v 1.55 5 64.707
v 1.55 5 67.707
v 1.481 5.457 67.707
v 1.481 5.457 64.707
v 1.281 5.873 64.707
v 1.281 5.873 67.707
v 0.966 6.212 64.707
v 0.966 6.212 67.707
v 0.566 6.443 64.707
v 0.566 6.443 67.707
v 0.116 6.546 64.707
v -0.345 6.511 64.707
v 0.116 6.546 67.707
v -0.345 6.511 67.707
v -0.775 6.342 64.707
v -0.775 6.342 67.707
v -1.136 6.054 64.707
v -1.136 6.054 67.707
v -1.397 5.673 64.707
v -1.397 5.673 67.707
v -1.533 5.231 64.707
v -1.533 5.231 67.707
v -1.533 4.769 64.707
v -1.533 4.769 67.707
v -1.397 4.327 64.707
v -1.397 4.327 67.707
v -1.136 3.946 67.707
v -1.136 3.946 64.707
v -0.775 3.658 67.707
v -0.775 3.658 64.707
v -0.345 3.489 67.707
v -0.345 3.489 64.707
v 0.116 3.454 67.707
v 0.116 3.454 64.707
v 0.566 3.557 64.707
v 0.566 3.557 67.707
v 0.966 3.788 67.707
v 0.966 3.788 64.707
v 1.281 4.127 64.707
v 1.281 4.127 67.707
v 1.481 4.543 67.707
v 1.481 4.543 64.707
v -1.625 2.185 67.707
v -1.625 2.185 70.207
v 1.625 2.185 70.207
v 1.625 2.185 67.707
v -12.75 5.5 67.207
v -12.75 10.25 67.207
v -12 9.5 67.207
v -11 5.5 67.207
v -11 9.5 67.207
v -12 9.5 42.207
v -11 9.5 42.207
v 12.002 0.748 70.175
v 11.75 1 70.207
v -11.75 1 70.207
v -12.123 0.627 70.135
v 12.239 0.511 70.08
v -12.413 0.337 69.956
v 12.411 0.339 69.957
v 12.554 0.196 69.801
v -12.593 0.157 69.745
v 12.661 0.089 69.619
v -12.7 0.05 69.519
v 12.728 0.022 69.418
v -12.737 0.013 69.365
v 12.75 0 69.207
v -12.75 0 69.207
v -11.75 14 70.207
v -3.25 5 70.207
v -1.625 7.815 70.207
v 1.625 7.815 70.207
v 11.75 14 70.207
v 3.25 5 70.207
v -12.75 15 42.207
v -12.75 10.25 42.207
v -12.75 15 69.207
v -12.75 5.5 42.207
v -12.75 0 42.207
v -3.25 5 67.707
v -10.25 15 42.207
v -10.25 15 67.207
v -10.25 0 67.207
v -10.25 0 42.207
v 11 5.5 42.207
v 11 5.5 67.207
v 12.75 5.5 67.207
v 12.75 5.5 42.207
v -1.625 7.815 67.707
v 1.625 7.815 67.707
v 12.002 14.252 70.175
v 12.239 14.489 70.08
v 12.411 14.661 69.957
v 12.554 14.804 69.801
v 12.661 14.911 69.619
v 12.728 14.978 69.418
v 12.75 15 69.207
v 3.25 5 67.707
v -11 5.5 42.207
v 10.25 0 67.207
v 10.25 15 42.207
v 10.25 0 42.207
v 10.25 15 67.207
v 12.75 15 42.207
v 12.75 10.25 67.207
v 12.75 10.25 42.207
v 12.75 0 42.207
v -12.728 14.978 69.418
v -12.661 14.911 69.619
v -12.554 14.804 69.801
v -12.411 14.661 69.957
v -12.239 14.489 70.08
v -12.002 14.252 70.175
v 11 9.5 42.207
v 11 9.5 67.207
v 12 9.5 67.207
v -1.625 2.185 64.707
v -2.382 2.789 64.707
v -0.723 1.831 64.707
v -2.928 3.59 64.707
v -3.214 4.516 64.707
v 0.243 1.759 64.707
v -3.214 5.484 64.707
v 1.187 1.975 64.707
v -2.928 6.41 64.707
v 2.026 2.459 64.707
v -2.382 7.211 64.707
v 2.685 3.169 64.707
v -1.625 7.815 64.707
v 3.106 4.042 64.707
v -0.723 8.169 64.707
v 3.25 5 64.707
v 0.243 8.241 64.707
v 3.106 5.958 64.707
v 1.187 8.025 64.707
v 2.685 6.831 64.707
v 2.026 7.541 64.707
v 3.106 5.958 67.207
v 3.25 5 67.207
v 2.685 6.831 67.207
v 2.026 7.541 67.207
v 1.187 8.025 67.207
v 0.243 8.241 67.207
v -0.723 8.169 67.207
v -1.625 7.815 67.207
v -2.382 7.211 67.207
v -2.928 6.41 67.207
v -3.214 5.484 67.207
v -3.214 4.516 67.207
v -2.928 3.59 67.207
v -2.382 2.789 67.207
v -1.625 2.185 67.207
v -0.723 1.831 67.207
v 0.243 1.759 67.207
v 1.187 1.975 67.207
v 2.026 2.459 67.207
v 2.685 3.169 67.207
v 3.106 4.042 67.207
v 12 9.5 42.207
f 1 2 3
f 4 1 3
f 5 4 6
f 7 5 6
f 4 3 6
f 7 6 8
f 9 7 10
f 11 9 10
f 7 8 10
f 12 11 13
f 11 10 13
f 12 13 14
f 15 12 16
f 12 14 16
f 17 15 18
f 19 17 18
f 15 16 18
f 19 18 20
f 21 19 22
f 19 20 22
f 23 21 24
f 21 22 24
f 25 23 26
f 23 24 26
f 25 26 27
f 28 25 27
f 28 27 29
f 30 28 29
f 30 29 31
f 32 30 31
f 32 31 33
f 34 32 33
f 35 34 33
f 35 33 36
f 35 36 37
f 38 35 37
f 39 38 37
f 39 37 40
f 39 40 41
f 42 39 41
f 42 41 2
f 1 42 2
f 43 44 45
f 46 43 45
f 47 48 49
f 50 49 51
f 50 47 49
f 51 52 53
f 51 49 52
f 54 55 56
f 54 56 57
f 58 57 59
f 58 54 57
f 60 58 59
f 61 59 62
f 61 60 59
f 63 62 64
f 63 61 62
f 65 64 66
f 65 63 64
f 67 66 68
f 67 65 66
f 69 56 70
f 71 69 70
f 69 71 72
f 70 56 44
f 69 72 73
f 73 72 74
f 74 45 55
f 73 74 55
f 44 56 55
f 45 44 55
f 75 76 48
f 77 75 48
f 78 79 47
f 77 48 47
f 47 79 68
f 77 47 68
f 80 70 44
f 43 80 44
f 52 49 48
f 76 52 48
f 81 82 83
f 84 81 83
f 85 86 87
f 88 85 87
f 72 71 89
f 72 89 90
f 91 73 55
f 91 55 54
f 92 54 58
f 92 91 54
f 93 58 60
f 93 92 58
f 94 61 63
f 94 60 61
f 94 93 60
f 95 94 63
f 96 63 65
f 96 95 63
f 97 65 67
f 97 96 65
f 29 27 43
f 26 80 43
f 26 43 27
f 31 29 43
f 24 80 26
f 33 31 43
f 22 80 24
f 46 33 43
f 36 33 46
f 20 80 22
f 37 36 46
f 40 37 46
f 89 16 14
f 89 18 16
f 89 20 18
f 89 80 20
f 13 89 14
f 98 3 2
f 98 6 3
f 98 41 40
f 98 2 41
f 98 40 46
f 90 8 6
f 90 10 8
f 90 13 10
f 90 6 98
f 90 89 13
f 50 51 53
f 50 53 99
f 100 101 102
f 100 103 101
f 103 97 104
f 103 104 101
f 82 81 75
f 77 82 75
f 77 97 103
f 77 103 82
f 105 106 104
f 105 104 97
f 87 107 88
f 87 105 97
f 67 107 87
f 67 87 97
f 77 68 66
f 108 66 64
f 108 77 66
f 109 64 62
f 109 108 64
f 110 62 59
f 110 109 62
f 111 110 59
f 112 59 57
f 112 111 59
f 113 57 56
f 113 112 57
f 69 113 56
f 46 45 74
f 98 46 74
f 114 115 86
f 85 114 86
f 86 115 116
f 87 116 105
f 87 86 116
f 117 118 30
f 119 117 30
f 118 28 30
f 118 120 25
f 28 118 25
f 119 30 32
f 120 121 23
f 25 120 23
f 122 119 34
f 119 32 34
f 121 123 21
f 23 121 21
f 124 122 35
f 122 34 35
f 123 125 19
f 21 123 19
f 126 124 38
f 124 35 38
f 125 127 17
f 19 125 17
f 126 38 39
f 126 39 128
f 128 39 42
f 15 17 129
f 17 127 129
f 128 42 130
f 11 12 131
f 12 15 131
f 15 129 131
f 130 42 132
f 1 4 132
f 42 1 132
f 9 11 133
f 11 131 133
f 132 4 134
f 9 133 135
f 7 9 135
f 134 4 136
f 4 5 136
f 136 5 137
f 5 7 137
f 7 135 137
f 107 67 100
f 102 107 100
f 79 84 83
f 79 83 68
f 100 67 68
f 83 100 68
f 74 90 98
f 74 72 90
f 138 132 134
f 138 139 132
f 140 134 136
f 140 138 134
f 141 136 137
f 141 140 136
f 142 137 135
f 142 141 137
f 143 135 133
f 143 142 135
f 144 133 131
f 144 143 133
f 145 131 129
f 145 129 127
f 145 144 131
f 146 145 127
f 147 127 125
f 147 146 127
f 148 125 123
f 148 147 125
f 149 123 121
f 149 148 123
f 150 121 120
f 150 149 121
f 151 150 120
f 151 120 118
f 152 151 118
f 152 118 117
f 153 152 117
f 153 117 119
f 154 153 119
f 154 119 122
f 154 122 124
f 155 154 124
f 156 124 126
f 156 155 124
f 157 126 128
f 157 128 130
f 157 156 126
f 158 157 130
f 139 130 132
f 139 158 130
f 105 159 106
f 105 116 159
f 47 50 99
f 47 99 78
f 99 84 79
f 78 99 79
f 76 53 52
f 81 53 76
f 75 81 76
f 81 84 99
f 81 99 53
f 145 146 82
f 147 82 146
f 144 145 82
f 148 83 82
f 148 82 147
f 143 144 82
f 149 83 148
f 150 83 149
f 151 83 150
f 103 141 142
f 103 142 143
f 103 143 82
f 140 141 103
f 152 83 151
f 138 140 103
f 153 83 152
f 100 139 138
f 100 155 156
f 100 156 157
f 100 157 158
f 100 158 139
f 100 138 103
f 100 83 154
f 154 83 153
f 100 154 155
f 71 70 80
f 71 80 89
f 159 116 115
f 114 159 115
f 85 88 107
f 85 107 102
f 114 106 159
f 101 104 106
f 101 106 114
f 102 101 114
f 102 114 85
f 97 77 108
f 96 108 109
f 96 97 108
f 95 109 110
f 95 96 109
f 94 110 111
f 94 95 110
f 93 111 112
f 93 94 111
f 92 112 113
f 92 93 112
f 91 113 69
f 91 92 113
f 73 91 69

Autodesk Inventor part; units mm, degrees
ref_plane "YZ Plane" through (0, 0, 0) normal (1, 0, 0) x (0, 1, 0)
ref_plane "XZ Plane" through (0, 0, 0) normal (0, 1, 0) x (-1, 0, 0)
ref_plane "XY Plane" through (0, 0, 0) normal (0, 0, 1) x (1, 0, 0)
sketch "Эскиз1" plane through (0, 0, 0) normal (0, 1, 0) x (-1, 0, 0)
  line L0 (0, 56.6418) -> (23.7825, 76.5969) construction
  line L1 (44.1942, 76.014) -> (76.014, 44.1942) construction
  line L2 (91.1, 52.2091) -> (52.2091, 91.1) construction
  line L3 (0, 0) -> (74.2462, 74.2462) construction
  arc A0 (92.5543, 49.5852) -> (48.7014, 93.0224) centre (0, 0) ccw construction
  line L4 (52.2091, 91.1) -> (48.6736, 87.5645) construction
  arc A1 (44.1942, 83.085) -> (44.1942, 76.014) centre (47.7297, 79.5495) ccw construction
  line L5 (52.2091, 91.1) -> (48.6736, 87.5645) construction
  line L6 (48.6736, 87.5645) -> (52.2091, 91.1) construction
  spline S0 degree 2 poles (48.6736, 87.5645) (52.2091, 91.1) (48.7014, 93.0224) knots 1 1 1 2 2 2 construction
  line L7 (52.2091, 91.1) -> (48.7014, 93.0224) construction
  line L8 (52.2091, 91.1) -> (48.7014, 93.0224) construction
  arc A2 (48.7014, 93.0224) -> (44.0271, 95.3237) centre (0, 0) ccw construction
  arc A3 (44.0271, 95.3237) -> (43.577, 95.5303) centre (0, 0) ccw construction
  line L9 (42.6652, 95.941) -> (43.577, 95.5303) construction
  line L10 (42.6652, 95.941) -> (43.577, 95.5303) construction
  spline S1 degree 2 poles (42.0492, 94.5734) (42.6652, 95.941) (43.577, 95.5303) knots 1 1 1 2 2 2 construction
  line L11 (42.0492, 94.5734) -> (42.6652, 95.941) construction
  line L12 (42.6652, 95.941) -> (42.0492, 94.5734) construction
  line L13 (0, 0) -> (0, 209.8821) construction
  spline S2 degree 2 poles (-48.6736, 87.5645) (-52.2091, 91.1) (-48.7014, 93.0224) knots 1 1 1 2 2 2 construction
  line L14 (-48.6736, 87.5645) -> (-52.2091, 91.1) construction
  line L15 (-52.2091, 91.1) -> (-48.7014, 93.0224) construction
  arc A4 (-44.1942, 76.014) -> (-44.1942, 83.085) centre (-47.7297, 79.5495) ccw construction
  line L16 (-44.1942, 76.014) -> (-76.014, 44.1942) construction
  arc A5 (-48.7014, 93.0224) -> (-92.5543, 49.5852) centre (0, 0) ccw construction
  arc A6 (-83.085, 44.1942) -> (-76.014, 44.1942) centre (-79.5495, 47.7297) ccw construction
  line L17 (-83.085, 44.1942) -> (-87.3563, 48.4654) construction
  spline S3 degree 2 poles (-48.6736, -87.5645) (-52.2091, -91.1) (-48.7014, -93.0224) knots 1 1 1 2 2 2 construction
  line L18 (-48.6736, -87.5645) -> (-52.2091, -91.1) construction
  line L19 (-52.2091, -91.1) -> (-48.7014, -93.0224) construction
  circle A7 centre (0, 0) radius 35 construction
  line L20 (-46.3155, -73.8927) -> (-73.8927, -46.3155) construction
  arc A8 (-73.8927, -46.3155) -> (-85.2064, -46.3155) centre (-79.5495, -51.9723) ccw construction
  line L21 (-85.2064, -46.3155) -> (-87.5645, -48.6736) construction
  line L22 (-87.5645, -48.6736) -> (-91.1, -52.2091) construction
  spline S4 degree 2 poles (-87.5645, -48.6736) (-91.1, -52.2091) (-92.5543, -49.5852) knots 1 1 1 2 2 2 construction
  line L23 (-91.1, -52.2091) -> (-92.5543, -49.5852) construction
  arc A9 (-92.5543, -49.5852) -> (-48.7014, -93.0224) centre (0, 0) ccw construction
  arc A10 (-92.5543, 49.5852) -> (-92.5543, -49.5852) centre (0, 0) ccw construction
  line L24 (48.6736, -87.5645) -> (46.3155, -85.2064) construction
  arc A11 (-46.3155, -85.2064) -> (-46.3155, -73.8927) centre (-51.9723, -79.5495) ccw construction
  line L25 (-48.6736, -87.5645) -> (-46.3155, -85.2064) construction
  arc A12 (-48.7014, -93.0224) -> (48.7014, -93.0224) centre (0, 0) ccw construction
  arc A13 (46.3155, -73.8927) -> (46.3155, -85.2064) centre (51.9723, -79.5495) ccw construction
  arc A14 (43.577, 95.5303) -> (-43.577, 95.5303) centre (0, 0) ccw construction
  arc A15 (23.7825, 76.5969) -> (0, 67.941) centre (0, 104.941) ccw construction
  line L26 (0, 56.6418) -> (-35.5516, 86.4744) construction
  line L27 (44.0271, 95.3237) -> (44.0271, 127.8162) construction
  ellipse E0 centre (0, 102.7511) end of major axis (44.0271, 102.7511) minor radius 27.5932 (42.0492, 94.5734) -> (35.2734, 86.2384) ccw construction
  line L28 (42.6652, 95.941) -> (-42.6652, 95.941) construction
  ellipse E1 centre (0, 102.7511) end of major axis (44.5159, 105.2445) minor radius 28.887 (35.2734, 86.2384) -> (42.0492, 94.5734) ccw construction
  line L29 (23.7825, 76.5969) -> (35.2734, 86.2384) construction
  arc A16 (0, 67.941) -> (23.7825, 76.5969) centre (0, 104.941) ccw construction
  arc A17 (-23.7825, 76.5969) -> (0, 67.941) centre (0, 104.941) ccw construction
  line L30 (-23.7825, 76.5969) -> (-35.2734, 86.2384) construction
  line L31 (-42.6652, 95.941) -> (-42.0492, 94.5734) construction
  arc A18 (-43.577, 95.5303) -> (-48.7014, 93.0224) centre (0, 0) ccw construction
  line L32 (-42.6652, 95.941) -> (-43.577, 95.5303) construction
  spline S5 degree 2 poles (-42.0492, 94.5734) (-42.6652, 95.941) (-43.577, 95.5303) knots 1 1 1 2 2 2 construction
  line L33 (-42.0492, 94.5734) -> (-42.6652, 95.941) construction
  line L34 (-42.6652, 95.941) -> (-43.577, 95.5303) construction
  line L35 (-42.6652, 95.941) -> (-43.577, 95.5303) construction
  spline S6 degree 2 poles (-42.0492, 94.5734) (-42.6652, 95.941) (-43.577, 95.5303) knots 1 1 1 2 2 2 construction
  line L36 (-42.0492, 94.5734) -> (-42.6652, 95.941) construction
  ellipse E2 centre (0, 102.7511) end of major axis (-44.5159, 105.2445) minor radius 28.887 (-42.0492, 94.5734) -> (-35.2734, 86.2384) ccw construction
  line L37 (83.085, 44.1942) -> (87.5645, 48.6736) construction
  arc A19 (76.014, 44.1942) -> (83.085, 44.1942) centre (79.5495, 47.7297) ccw construction
  spline S7 degree 2 poles (48.6736, -87.5645) (52.2091, -91.1) (48.7014, -93.0224) knots 1 1 1 2 2 2 construction
  line L38 (48.6736, -87.5645) -> (52.2091, -91.1) construction
  line L39 (52.2091, -91.1) -> (48.7014, -93.0224) construction
  line L40 (46.3155, -73.8927) -> (73.8927, -46.3155) construction
  arc A20 (85.2064, -46.3155) -> (73.8927, -46.3155) centre (79.5495, -51.9723) ccw construction
  line L41 (85.2064, -46.3155) -> (87.5645, -48.6736) construction
  spline S8 degree 2 poles (87.5645, -48.6736) (91.1, -52.2091) (92.5543, -49.5852) knots 1 1 1 2 2 2 construction
  line L42 (87.5645, -48.6736) -> (91.1, -52.2091) construction
  line L43 (91.1, -52.2091) -> (92.5543, -49.5852) construction
  arc A21 (92.5543, -49.5852) -> (92.5543, 49.5852) centre (0, 0) ccw construction
  arc A22 (48.7014, -93.0224) -> (92.5543, -49.5852) centre (0, 0) ccw construction
  arc A23 (28.5452, 71.4571) -> (-28.5452, 71.4571) centre (0, 104.941) ccw construction
  line L44 (-83.085, 34.2947) -> (-90.6891, 41.8987) construction
  line L45 (-93.5297, 47.6709) -> (-92.5543, 49.5852) construction
  line L46 (-29.1816, 81.127) -> (-76.014, 34.2947) construction
  arc A24 (-83.085, 34.2947) -> (-76.014, 34.2947) centre (-79.5495, 37.8302) ccw construction
  line L47 (-34.1491, 76.1596) -> (-28.5452, 71.4571) construction
  arc A25 (-30.6393, 73.2144) -> (-37.3889, 72.9198) centre (-33.8534, 69.3842) ccw construction
  arc A26 (-90.6891, 41.8987) -> (-87.3563, 48.4654) centre (0, 0) ccw construction
  arc A27 (37.3889, 72.9198) -> (30.6393, 73.2144) centre (33.8534, 69.3842) ccw construction
  line L48 (29.1816, 81.127) -> (76.014, 34.2947) construction
  arc A28 (76.014, 34.2947) -> (83.085, 34.2947) centre (79.5495, 37.8302) ccw construction
  line L49 (83.085, 34.2947) -> (90.6891, 41.8987) construction
  arc A29 (76.014, 44.1942) -> (83.085, 44.1942) centre (79.5495, 47.7297) ccw construction
  line L50 (44.1942, 76.014) -> (76.014, 44.1942) construction
  arc A30 (44.1942, 83.085) -> (44.1942, 76.014) centre (47.7297, 79.5495) ccw construction
  arc A31 (5.5413, 61.2914) -> (28.5452, 71.4571) centre (0, 104.941) ccw
  arc A32 (-28.5452, 71.4571) -> (5.5413, 61.2914) centre (0, 104.941) ccw
  line L51 (34.1491, 76.1596) -> (28.5452, 71.4571) construction
  arc A33 (-87.3563, 48.4654) -> (-90.6891, 41.8987) centre (0, 0) ccw construction
  line L52 (83.085, 44.1942) -> (87.3563, 48.4654) construction
  arc A34 (90.6891, 41.8987) -> (87.3563, 48.4654) centre (0, 0) ccw construction
  line L53 (-44.1942, 83.085) -> (-48.6736, 87.5645) construction
  line L54 (44.0271, 95.3237) -> (43.577, 95.5303) construction
  line L55 (48.6736, 87.5645) -> (44.1942, 83.085) construction
  line L56 (0, 104.941) -> (-23.6028, 54.3247) construction
  circle A35 centre (31.1916, 76.2887) radius 2 construction
  line L57 (29.1816, 81.127) -> (23.7825, 76.5969)
  line L58 (29.1816, 81.127) -> (34.1491, 76.1596)
  line L59 (34.1491, 76.1596) -> (28.5452, 71.4571)
  line L60 (-28.5452, 71.4571) -> (-34.1491, 76.1596)
  line L61 (-23.7825, 76.5969) -> (-29.1816, 81.127)
  line L62 (-29.1816, 81.127) -> (-34.1491, 76.1596)
  arc A36 (-26.6462, 78.9996) -> (-31.2232, 73.7044) centre (-28.9734, 76.3855) ccw
  arc A37 (31.2232, 73.7044) -> (26.6462, 78.9996) centre (28.9734, 76.3855) ccw
  line L63 (12.75, 58.0269) -> (-12.75, 58.0269)
  line L64 (0, 67.941) -> (0, 64.941) construction
  line L65 (-12.75, 58.0269) -> (-12.75, 67.2072) construction
  line L66 (12.75, 58.0269) -> (12.75, 67.2072) construction
  arc A38 (-12.75, 67.2072) -> (12.75, 67.2072) centre (0, 101.941) ccw
  line L67 (12.75, 67.2072) -> (12.75, 70.2072)
  line L68 (-12.75, 70.2072) -> (-12.75, 70.2072) construction
  line L69 (-12.75, 67.2072) -> (-12.75, 70.2072)
  line L70 (10.1, 59.4125) -> (-10.1, 59.4125) construction
  line L71 (12.75, 70.2072) -> (-12.75, 70.2072)
  line L72 (12.75, 67.2072) -> (-12.75, 67.2072)
  point P0 (60.1041, 60.1041)
  point P1 (40.6586, 79.5495)
  point P2 (79.5495, 40.6586)
  point P3 (0, 105)
  point P4 (-87.5645, 48.6736)
  point P5 (-23.542, 76.3968)
  point P6 (-34.9935, 86.0061)
  point P7 (0, 95.941)
  point P8 (-94.5192, 45.7288)
  point P9 (-13.2817, 58.6489)
  point P10 (-28.5452, 71.4571)
  point P11 (13.2817, 58.6489)
  point P12 (-15.6369, 71.4076)
  point P13 (-26.8032, 79.1314)
  point P14 (-31.2232, 73.7044)
  point P15 (26.8032, 79.1314)
  dimension "d67" = 44.5856
  dimension "d48" = 74
  dimension "d49" = 100
  dimension "d50" = 28
  dimension "d51" = 15
  dimension "d52" = 45
  dimension "d53" = 55
  dimension "d54" = 16.3348
  dimension "d55" = 27.5
  dimension "d56" = 5
  dimension "d57" = 5
  dimension "d58" = 1
  dimension "d59" = 1.5
  dimension "d60" = 1.5
  dimension "d61" = 1
  dimension "d62" = 4
  dimension "d63" = 70
  dimension "d64" = 85
  dimension "d65" = 105
  dimension "d66" = 1.3619
  dimension "d68" = 88
  dimension "d69" = 7
  dimension "d70" = 5
  dimension "d71" = 7
  dimension "d72" = 5
  dimension "d73" = 7
  dimension "d74" = 5
  dimension "d75" = 5.1
  dimension "d78" = 4
  dimension "d166" = 25.5
  dimension "d169" = 3
  dimension "d171" = 3
  dimension "d172" = 3
  dimension "d173" = 20.2
extrude "Выдавливание7" add sketch "Эскиз1" along normal blind 15 contours L69 L71 L67 L72
sketch "Эскиз10" plane through (12.75, 0, 67.2072) normal (0, 0, -1) x (-1, 0, 0)
  line L0 (25.5, 0) -> (0, 0) construction
  line L1 (0, 0) -> (0, 15) construction
  line L2 (25.5, 15) -> (0, 15) construction
  line L3 (25.5, 0) -> (25.5, 15) construction
  line L4 (25.5, 15) -> (0, 15) construction
  line L5 (12.75, 15) -> (12.75, 0) construction
  line L6 (-0.25, 15.8948) -> (-0.25, -2.2577) construction
  line L7 (0, 15) -> (2.5, 15)
  line L8 (2.5, 15) -> (2.5, 0)
  line L9 (2.5, 0) -> (0, 0)
  line L10 (0, 0) -> (0, 15)
  line L11 (0, 9) -> (2.5, 9) construction
  line L12 (0, 0) -> (0, 15) construction
  line L13 (0, 9.5) -> (1.75, 9.5)
  line L14 (1.75, 9.5) -> (1.75, 5.5)
  line L15 (1.75, 5.5) -> (0, 5.5)
  line L16 (0, 5.5) -> (0, 9.5) construction
  line L17 (0, 9) -> (1.25, 9) construction
  line L18 (1.25, 9) -> (1.25, 6) construction
  line L19 (1.25, 6) -> (0, 6) construction
  line L20 (0, 6) -> (0, 9) construction
  line L21 (1.25, 9) -> (0, 10.25)
  line L22 (25.5, 0) -> (25.5, 15) construction
  line L23 (25.5, 15) -> (23, 15)
  line L24 (23, 15) -> (23, 0)
  line L25 (23, 0) -> (25.5, 0)
  line L26 (25.5, 0) -> (25.5, 15)
  line L27 (25.5, 9) -> (23, 9) construction
  line L28 (25.5, 0) -> (25.5, 15) construction
  line L29 (25.5, 9.5) -> (23.75, 9.5)
  line L30 (23.75, 9.5) -> (23.75, 5.5)
  line L31 (23.75, 5.5) -> (25.5, 5.5)
  line L32 (25.5, 5.5) -> (25.5, 9.5) construction
  line L33 (25.5, 9) -> (24.25, 9) construction
  line L34 (24.25, 9) -> (24.25, 6) construction
  line L35 (24.25, 6) -> (25.5, 6) construction
  line L36 (25.5, 6) -> (25.5, 9) construction
  line L37 (24.25, 9) -> (25.5, 10.25)
  point P0 (24.75, 9.5)
  point P1 (0, 5.5)
  point P2 (0, 10.25)
  point P3 (0.75, 9.5)
  dimension "d215" = 26
  dimension "d216" = 20.5
  dimension "d218" = 3
  dimension "d219" = 1.5
  dimension "d220" = 0.5
  dimension "d221" = 0.5
  dimension "d222" = 0.5
  dimension "d223" = 135
  dimension "d237" = 5.5
extrude "Выдавливание16" add sketch "Эскиз10" along normal blind 25 contours L7 L8 L9 L10 L15 L14 L13 L21 | L26 L37 L29 L30 L31 L25 L24 L23
sketch "Эскиз12" plane through (-12.75, 0, 70.2072) normal (0, 0, 1) x (1, 0, 0)
  line L0 (0, 15) -> (2.5, 15) construction
  line L1 (2.5, 15) -> (2.5, 0) construction
  line L2 (2.5, 0) -> (0, 0) construction
  line L3 (0, 0) -> (0, 5.5) construction
  line L4 (0, 5.5) -> (1.75, 5.5) construction
  line L5 (1.75, 5.5) -> (1.75, 9.5) construction
  line L6 (1.75, 9.5) -> (0.75, 9.5) construction
  line L7 (0.75, 9.5) -> (0, 10.25) construction
  line L8 (0, 10.25) -> (0, 15) construction
  line L9 (0, 0) -> (25.5, 0) construction
  line L10 (25.5, 0) -> (25.5, 15) construction
  line L11 (0, 15) -> (25.5, 15) construction
  line L12 (0, 0) -> (0, 15) construction
  line L13 (25.5, 15) -> (25.5, 10.25) construction
  line L14 (25.5, 10.25) -> (24.75, 9.5) construction
  line L15 (24.75, 9.5) -> (23.75, 9.5) construction
  line L16 (23.75, 9.5) -> (23.75, 5.5) construction
  line L17 (23.75, 5.5) -> (25.5, 5.5) construction
  line L18 (25.5, 5.5) -> (25.5, 0) construction
  line L19 (25.5, 0) -> (23, 0) construction
  line L20 (23, 0) -> (23, 15) construction
  line L21 (23, 15) -> (25.5, 15) construction
  line L22 (23, 0) -> (23, 15) construction
  line L23 (0, 15) -> (25.5, 15) construction
  line L24 (23, 15) -> (25.5, 15) construction
  line L25 (23, 15) -> (2.5, 15) construction
  line L26 (0, 15) -> (2.5, 15) construction
  line L27 (25.5, 0) -> (25.5, 15) construction
  line L28 (25.5, 5.5) -> (25.5, 10.25) construction
  line L29 (0, 0) -> (0, 15) construction
  line L30 (0, 15) -> (25.5, 15) construction
  line L31 (12.75, 15) -> (12.75, 0) construction
  circle A0 centre (12.75, 5) radius 3.25
  line L32 (12.75, 5) -> (16, 5) construction
  line L33 (12.75, 5) -> (14.375, 7.8146) construction
  line L34 (12.75, 5) -> (11.125, 7.8146) construction
  line L35 (12.75, 5) -> (9.5, 5) construction
  line L36 (12.75, 5) -> (14.375, 2.1854) construction
  line L37 (12.75, 5) -> (11.125, 2.1854) construction
  line L38 (14.375, 7.8146) -> (16, 5)
  line L39 (11.125, 7.8146) -> (14.375, 7.8146)
  line L40 (9.5, 5) -> (11.125, 7.8146)
  line L41 (14.375, 2.1854) -> (16, 5)
  line L42 (11.125, 2.1854) -> (14.375, 2.1854)
  line L43 (9.5, 5) -> (11.125, 2.1854)
  circle A1 centre (12.75, 5) radius 1.55
  dimension "d226" = 6.5
  dimension "d228" = 60
  dimension "d229" = 3.1
  dimension "d238" = 5
extrude "Выдавливание17" add sketch "Эскиз12" against normal blind 5.5 contours L38 A0 | L41 L42 L43 L40 L39 L38 | A0 L41 | L39 A0 | A0 L42 | L40 A0 | A0 L43 | A1
extrude "Выдавливание18" cut sketch "Эскиз12" against normal blind 5.5 contours A1
extrude "Выдавливание19" cut sketch "Эскиз12" against normal blind 2.5 contours L41 L42 L43 L40 L39 L38
fillet "Сопряжение1" radius 1 4 edges at (0, 15, 70.2072) (12.75, 7.5, 70.2072) (0, 0, 70.2072) (-12.75, 7.5, 70.2072)
sketch "Эскиз13" plane through (0, 15, 0) normal (0, 1, 0) x (1, 0, 0)
  point P0 (0, 0)
properties part number "_3DПЕЧАТЬ"
